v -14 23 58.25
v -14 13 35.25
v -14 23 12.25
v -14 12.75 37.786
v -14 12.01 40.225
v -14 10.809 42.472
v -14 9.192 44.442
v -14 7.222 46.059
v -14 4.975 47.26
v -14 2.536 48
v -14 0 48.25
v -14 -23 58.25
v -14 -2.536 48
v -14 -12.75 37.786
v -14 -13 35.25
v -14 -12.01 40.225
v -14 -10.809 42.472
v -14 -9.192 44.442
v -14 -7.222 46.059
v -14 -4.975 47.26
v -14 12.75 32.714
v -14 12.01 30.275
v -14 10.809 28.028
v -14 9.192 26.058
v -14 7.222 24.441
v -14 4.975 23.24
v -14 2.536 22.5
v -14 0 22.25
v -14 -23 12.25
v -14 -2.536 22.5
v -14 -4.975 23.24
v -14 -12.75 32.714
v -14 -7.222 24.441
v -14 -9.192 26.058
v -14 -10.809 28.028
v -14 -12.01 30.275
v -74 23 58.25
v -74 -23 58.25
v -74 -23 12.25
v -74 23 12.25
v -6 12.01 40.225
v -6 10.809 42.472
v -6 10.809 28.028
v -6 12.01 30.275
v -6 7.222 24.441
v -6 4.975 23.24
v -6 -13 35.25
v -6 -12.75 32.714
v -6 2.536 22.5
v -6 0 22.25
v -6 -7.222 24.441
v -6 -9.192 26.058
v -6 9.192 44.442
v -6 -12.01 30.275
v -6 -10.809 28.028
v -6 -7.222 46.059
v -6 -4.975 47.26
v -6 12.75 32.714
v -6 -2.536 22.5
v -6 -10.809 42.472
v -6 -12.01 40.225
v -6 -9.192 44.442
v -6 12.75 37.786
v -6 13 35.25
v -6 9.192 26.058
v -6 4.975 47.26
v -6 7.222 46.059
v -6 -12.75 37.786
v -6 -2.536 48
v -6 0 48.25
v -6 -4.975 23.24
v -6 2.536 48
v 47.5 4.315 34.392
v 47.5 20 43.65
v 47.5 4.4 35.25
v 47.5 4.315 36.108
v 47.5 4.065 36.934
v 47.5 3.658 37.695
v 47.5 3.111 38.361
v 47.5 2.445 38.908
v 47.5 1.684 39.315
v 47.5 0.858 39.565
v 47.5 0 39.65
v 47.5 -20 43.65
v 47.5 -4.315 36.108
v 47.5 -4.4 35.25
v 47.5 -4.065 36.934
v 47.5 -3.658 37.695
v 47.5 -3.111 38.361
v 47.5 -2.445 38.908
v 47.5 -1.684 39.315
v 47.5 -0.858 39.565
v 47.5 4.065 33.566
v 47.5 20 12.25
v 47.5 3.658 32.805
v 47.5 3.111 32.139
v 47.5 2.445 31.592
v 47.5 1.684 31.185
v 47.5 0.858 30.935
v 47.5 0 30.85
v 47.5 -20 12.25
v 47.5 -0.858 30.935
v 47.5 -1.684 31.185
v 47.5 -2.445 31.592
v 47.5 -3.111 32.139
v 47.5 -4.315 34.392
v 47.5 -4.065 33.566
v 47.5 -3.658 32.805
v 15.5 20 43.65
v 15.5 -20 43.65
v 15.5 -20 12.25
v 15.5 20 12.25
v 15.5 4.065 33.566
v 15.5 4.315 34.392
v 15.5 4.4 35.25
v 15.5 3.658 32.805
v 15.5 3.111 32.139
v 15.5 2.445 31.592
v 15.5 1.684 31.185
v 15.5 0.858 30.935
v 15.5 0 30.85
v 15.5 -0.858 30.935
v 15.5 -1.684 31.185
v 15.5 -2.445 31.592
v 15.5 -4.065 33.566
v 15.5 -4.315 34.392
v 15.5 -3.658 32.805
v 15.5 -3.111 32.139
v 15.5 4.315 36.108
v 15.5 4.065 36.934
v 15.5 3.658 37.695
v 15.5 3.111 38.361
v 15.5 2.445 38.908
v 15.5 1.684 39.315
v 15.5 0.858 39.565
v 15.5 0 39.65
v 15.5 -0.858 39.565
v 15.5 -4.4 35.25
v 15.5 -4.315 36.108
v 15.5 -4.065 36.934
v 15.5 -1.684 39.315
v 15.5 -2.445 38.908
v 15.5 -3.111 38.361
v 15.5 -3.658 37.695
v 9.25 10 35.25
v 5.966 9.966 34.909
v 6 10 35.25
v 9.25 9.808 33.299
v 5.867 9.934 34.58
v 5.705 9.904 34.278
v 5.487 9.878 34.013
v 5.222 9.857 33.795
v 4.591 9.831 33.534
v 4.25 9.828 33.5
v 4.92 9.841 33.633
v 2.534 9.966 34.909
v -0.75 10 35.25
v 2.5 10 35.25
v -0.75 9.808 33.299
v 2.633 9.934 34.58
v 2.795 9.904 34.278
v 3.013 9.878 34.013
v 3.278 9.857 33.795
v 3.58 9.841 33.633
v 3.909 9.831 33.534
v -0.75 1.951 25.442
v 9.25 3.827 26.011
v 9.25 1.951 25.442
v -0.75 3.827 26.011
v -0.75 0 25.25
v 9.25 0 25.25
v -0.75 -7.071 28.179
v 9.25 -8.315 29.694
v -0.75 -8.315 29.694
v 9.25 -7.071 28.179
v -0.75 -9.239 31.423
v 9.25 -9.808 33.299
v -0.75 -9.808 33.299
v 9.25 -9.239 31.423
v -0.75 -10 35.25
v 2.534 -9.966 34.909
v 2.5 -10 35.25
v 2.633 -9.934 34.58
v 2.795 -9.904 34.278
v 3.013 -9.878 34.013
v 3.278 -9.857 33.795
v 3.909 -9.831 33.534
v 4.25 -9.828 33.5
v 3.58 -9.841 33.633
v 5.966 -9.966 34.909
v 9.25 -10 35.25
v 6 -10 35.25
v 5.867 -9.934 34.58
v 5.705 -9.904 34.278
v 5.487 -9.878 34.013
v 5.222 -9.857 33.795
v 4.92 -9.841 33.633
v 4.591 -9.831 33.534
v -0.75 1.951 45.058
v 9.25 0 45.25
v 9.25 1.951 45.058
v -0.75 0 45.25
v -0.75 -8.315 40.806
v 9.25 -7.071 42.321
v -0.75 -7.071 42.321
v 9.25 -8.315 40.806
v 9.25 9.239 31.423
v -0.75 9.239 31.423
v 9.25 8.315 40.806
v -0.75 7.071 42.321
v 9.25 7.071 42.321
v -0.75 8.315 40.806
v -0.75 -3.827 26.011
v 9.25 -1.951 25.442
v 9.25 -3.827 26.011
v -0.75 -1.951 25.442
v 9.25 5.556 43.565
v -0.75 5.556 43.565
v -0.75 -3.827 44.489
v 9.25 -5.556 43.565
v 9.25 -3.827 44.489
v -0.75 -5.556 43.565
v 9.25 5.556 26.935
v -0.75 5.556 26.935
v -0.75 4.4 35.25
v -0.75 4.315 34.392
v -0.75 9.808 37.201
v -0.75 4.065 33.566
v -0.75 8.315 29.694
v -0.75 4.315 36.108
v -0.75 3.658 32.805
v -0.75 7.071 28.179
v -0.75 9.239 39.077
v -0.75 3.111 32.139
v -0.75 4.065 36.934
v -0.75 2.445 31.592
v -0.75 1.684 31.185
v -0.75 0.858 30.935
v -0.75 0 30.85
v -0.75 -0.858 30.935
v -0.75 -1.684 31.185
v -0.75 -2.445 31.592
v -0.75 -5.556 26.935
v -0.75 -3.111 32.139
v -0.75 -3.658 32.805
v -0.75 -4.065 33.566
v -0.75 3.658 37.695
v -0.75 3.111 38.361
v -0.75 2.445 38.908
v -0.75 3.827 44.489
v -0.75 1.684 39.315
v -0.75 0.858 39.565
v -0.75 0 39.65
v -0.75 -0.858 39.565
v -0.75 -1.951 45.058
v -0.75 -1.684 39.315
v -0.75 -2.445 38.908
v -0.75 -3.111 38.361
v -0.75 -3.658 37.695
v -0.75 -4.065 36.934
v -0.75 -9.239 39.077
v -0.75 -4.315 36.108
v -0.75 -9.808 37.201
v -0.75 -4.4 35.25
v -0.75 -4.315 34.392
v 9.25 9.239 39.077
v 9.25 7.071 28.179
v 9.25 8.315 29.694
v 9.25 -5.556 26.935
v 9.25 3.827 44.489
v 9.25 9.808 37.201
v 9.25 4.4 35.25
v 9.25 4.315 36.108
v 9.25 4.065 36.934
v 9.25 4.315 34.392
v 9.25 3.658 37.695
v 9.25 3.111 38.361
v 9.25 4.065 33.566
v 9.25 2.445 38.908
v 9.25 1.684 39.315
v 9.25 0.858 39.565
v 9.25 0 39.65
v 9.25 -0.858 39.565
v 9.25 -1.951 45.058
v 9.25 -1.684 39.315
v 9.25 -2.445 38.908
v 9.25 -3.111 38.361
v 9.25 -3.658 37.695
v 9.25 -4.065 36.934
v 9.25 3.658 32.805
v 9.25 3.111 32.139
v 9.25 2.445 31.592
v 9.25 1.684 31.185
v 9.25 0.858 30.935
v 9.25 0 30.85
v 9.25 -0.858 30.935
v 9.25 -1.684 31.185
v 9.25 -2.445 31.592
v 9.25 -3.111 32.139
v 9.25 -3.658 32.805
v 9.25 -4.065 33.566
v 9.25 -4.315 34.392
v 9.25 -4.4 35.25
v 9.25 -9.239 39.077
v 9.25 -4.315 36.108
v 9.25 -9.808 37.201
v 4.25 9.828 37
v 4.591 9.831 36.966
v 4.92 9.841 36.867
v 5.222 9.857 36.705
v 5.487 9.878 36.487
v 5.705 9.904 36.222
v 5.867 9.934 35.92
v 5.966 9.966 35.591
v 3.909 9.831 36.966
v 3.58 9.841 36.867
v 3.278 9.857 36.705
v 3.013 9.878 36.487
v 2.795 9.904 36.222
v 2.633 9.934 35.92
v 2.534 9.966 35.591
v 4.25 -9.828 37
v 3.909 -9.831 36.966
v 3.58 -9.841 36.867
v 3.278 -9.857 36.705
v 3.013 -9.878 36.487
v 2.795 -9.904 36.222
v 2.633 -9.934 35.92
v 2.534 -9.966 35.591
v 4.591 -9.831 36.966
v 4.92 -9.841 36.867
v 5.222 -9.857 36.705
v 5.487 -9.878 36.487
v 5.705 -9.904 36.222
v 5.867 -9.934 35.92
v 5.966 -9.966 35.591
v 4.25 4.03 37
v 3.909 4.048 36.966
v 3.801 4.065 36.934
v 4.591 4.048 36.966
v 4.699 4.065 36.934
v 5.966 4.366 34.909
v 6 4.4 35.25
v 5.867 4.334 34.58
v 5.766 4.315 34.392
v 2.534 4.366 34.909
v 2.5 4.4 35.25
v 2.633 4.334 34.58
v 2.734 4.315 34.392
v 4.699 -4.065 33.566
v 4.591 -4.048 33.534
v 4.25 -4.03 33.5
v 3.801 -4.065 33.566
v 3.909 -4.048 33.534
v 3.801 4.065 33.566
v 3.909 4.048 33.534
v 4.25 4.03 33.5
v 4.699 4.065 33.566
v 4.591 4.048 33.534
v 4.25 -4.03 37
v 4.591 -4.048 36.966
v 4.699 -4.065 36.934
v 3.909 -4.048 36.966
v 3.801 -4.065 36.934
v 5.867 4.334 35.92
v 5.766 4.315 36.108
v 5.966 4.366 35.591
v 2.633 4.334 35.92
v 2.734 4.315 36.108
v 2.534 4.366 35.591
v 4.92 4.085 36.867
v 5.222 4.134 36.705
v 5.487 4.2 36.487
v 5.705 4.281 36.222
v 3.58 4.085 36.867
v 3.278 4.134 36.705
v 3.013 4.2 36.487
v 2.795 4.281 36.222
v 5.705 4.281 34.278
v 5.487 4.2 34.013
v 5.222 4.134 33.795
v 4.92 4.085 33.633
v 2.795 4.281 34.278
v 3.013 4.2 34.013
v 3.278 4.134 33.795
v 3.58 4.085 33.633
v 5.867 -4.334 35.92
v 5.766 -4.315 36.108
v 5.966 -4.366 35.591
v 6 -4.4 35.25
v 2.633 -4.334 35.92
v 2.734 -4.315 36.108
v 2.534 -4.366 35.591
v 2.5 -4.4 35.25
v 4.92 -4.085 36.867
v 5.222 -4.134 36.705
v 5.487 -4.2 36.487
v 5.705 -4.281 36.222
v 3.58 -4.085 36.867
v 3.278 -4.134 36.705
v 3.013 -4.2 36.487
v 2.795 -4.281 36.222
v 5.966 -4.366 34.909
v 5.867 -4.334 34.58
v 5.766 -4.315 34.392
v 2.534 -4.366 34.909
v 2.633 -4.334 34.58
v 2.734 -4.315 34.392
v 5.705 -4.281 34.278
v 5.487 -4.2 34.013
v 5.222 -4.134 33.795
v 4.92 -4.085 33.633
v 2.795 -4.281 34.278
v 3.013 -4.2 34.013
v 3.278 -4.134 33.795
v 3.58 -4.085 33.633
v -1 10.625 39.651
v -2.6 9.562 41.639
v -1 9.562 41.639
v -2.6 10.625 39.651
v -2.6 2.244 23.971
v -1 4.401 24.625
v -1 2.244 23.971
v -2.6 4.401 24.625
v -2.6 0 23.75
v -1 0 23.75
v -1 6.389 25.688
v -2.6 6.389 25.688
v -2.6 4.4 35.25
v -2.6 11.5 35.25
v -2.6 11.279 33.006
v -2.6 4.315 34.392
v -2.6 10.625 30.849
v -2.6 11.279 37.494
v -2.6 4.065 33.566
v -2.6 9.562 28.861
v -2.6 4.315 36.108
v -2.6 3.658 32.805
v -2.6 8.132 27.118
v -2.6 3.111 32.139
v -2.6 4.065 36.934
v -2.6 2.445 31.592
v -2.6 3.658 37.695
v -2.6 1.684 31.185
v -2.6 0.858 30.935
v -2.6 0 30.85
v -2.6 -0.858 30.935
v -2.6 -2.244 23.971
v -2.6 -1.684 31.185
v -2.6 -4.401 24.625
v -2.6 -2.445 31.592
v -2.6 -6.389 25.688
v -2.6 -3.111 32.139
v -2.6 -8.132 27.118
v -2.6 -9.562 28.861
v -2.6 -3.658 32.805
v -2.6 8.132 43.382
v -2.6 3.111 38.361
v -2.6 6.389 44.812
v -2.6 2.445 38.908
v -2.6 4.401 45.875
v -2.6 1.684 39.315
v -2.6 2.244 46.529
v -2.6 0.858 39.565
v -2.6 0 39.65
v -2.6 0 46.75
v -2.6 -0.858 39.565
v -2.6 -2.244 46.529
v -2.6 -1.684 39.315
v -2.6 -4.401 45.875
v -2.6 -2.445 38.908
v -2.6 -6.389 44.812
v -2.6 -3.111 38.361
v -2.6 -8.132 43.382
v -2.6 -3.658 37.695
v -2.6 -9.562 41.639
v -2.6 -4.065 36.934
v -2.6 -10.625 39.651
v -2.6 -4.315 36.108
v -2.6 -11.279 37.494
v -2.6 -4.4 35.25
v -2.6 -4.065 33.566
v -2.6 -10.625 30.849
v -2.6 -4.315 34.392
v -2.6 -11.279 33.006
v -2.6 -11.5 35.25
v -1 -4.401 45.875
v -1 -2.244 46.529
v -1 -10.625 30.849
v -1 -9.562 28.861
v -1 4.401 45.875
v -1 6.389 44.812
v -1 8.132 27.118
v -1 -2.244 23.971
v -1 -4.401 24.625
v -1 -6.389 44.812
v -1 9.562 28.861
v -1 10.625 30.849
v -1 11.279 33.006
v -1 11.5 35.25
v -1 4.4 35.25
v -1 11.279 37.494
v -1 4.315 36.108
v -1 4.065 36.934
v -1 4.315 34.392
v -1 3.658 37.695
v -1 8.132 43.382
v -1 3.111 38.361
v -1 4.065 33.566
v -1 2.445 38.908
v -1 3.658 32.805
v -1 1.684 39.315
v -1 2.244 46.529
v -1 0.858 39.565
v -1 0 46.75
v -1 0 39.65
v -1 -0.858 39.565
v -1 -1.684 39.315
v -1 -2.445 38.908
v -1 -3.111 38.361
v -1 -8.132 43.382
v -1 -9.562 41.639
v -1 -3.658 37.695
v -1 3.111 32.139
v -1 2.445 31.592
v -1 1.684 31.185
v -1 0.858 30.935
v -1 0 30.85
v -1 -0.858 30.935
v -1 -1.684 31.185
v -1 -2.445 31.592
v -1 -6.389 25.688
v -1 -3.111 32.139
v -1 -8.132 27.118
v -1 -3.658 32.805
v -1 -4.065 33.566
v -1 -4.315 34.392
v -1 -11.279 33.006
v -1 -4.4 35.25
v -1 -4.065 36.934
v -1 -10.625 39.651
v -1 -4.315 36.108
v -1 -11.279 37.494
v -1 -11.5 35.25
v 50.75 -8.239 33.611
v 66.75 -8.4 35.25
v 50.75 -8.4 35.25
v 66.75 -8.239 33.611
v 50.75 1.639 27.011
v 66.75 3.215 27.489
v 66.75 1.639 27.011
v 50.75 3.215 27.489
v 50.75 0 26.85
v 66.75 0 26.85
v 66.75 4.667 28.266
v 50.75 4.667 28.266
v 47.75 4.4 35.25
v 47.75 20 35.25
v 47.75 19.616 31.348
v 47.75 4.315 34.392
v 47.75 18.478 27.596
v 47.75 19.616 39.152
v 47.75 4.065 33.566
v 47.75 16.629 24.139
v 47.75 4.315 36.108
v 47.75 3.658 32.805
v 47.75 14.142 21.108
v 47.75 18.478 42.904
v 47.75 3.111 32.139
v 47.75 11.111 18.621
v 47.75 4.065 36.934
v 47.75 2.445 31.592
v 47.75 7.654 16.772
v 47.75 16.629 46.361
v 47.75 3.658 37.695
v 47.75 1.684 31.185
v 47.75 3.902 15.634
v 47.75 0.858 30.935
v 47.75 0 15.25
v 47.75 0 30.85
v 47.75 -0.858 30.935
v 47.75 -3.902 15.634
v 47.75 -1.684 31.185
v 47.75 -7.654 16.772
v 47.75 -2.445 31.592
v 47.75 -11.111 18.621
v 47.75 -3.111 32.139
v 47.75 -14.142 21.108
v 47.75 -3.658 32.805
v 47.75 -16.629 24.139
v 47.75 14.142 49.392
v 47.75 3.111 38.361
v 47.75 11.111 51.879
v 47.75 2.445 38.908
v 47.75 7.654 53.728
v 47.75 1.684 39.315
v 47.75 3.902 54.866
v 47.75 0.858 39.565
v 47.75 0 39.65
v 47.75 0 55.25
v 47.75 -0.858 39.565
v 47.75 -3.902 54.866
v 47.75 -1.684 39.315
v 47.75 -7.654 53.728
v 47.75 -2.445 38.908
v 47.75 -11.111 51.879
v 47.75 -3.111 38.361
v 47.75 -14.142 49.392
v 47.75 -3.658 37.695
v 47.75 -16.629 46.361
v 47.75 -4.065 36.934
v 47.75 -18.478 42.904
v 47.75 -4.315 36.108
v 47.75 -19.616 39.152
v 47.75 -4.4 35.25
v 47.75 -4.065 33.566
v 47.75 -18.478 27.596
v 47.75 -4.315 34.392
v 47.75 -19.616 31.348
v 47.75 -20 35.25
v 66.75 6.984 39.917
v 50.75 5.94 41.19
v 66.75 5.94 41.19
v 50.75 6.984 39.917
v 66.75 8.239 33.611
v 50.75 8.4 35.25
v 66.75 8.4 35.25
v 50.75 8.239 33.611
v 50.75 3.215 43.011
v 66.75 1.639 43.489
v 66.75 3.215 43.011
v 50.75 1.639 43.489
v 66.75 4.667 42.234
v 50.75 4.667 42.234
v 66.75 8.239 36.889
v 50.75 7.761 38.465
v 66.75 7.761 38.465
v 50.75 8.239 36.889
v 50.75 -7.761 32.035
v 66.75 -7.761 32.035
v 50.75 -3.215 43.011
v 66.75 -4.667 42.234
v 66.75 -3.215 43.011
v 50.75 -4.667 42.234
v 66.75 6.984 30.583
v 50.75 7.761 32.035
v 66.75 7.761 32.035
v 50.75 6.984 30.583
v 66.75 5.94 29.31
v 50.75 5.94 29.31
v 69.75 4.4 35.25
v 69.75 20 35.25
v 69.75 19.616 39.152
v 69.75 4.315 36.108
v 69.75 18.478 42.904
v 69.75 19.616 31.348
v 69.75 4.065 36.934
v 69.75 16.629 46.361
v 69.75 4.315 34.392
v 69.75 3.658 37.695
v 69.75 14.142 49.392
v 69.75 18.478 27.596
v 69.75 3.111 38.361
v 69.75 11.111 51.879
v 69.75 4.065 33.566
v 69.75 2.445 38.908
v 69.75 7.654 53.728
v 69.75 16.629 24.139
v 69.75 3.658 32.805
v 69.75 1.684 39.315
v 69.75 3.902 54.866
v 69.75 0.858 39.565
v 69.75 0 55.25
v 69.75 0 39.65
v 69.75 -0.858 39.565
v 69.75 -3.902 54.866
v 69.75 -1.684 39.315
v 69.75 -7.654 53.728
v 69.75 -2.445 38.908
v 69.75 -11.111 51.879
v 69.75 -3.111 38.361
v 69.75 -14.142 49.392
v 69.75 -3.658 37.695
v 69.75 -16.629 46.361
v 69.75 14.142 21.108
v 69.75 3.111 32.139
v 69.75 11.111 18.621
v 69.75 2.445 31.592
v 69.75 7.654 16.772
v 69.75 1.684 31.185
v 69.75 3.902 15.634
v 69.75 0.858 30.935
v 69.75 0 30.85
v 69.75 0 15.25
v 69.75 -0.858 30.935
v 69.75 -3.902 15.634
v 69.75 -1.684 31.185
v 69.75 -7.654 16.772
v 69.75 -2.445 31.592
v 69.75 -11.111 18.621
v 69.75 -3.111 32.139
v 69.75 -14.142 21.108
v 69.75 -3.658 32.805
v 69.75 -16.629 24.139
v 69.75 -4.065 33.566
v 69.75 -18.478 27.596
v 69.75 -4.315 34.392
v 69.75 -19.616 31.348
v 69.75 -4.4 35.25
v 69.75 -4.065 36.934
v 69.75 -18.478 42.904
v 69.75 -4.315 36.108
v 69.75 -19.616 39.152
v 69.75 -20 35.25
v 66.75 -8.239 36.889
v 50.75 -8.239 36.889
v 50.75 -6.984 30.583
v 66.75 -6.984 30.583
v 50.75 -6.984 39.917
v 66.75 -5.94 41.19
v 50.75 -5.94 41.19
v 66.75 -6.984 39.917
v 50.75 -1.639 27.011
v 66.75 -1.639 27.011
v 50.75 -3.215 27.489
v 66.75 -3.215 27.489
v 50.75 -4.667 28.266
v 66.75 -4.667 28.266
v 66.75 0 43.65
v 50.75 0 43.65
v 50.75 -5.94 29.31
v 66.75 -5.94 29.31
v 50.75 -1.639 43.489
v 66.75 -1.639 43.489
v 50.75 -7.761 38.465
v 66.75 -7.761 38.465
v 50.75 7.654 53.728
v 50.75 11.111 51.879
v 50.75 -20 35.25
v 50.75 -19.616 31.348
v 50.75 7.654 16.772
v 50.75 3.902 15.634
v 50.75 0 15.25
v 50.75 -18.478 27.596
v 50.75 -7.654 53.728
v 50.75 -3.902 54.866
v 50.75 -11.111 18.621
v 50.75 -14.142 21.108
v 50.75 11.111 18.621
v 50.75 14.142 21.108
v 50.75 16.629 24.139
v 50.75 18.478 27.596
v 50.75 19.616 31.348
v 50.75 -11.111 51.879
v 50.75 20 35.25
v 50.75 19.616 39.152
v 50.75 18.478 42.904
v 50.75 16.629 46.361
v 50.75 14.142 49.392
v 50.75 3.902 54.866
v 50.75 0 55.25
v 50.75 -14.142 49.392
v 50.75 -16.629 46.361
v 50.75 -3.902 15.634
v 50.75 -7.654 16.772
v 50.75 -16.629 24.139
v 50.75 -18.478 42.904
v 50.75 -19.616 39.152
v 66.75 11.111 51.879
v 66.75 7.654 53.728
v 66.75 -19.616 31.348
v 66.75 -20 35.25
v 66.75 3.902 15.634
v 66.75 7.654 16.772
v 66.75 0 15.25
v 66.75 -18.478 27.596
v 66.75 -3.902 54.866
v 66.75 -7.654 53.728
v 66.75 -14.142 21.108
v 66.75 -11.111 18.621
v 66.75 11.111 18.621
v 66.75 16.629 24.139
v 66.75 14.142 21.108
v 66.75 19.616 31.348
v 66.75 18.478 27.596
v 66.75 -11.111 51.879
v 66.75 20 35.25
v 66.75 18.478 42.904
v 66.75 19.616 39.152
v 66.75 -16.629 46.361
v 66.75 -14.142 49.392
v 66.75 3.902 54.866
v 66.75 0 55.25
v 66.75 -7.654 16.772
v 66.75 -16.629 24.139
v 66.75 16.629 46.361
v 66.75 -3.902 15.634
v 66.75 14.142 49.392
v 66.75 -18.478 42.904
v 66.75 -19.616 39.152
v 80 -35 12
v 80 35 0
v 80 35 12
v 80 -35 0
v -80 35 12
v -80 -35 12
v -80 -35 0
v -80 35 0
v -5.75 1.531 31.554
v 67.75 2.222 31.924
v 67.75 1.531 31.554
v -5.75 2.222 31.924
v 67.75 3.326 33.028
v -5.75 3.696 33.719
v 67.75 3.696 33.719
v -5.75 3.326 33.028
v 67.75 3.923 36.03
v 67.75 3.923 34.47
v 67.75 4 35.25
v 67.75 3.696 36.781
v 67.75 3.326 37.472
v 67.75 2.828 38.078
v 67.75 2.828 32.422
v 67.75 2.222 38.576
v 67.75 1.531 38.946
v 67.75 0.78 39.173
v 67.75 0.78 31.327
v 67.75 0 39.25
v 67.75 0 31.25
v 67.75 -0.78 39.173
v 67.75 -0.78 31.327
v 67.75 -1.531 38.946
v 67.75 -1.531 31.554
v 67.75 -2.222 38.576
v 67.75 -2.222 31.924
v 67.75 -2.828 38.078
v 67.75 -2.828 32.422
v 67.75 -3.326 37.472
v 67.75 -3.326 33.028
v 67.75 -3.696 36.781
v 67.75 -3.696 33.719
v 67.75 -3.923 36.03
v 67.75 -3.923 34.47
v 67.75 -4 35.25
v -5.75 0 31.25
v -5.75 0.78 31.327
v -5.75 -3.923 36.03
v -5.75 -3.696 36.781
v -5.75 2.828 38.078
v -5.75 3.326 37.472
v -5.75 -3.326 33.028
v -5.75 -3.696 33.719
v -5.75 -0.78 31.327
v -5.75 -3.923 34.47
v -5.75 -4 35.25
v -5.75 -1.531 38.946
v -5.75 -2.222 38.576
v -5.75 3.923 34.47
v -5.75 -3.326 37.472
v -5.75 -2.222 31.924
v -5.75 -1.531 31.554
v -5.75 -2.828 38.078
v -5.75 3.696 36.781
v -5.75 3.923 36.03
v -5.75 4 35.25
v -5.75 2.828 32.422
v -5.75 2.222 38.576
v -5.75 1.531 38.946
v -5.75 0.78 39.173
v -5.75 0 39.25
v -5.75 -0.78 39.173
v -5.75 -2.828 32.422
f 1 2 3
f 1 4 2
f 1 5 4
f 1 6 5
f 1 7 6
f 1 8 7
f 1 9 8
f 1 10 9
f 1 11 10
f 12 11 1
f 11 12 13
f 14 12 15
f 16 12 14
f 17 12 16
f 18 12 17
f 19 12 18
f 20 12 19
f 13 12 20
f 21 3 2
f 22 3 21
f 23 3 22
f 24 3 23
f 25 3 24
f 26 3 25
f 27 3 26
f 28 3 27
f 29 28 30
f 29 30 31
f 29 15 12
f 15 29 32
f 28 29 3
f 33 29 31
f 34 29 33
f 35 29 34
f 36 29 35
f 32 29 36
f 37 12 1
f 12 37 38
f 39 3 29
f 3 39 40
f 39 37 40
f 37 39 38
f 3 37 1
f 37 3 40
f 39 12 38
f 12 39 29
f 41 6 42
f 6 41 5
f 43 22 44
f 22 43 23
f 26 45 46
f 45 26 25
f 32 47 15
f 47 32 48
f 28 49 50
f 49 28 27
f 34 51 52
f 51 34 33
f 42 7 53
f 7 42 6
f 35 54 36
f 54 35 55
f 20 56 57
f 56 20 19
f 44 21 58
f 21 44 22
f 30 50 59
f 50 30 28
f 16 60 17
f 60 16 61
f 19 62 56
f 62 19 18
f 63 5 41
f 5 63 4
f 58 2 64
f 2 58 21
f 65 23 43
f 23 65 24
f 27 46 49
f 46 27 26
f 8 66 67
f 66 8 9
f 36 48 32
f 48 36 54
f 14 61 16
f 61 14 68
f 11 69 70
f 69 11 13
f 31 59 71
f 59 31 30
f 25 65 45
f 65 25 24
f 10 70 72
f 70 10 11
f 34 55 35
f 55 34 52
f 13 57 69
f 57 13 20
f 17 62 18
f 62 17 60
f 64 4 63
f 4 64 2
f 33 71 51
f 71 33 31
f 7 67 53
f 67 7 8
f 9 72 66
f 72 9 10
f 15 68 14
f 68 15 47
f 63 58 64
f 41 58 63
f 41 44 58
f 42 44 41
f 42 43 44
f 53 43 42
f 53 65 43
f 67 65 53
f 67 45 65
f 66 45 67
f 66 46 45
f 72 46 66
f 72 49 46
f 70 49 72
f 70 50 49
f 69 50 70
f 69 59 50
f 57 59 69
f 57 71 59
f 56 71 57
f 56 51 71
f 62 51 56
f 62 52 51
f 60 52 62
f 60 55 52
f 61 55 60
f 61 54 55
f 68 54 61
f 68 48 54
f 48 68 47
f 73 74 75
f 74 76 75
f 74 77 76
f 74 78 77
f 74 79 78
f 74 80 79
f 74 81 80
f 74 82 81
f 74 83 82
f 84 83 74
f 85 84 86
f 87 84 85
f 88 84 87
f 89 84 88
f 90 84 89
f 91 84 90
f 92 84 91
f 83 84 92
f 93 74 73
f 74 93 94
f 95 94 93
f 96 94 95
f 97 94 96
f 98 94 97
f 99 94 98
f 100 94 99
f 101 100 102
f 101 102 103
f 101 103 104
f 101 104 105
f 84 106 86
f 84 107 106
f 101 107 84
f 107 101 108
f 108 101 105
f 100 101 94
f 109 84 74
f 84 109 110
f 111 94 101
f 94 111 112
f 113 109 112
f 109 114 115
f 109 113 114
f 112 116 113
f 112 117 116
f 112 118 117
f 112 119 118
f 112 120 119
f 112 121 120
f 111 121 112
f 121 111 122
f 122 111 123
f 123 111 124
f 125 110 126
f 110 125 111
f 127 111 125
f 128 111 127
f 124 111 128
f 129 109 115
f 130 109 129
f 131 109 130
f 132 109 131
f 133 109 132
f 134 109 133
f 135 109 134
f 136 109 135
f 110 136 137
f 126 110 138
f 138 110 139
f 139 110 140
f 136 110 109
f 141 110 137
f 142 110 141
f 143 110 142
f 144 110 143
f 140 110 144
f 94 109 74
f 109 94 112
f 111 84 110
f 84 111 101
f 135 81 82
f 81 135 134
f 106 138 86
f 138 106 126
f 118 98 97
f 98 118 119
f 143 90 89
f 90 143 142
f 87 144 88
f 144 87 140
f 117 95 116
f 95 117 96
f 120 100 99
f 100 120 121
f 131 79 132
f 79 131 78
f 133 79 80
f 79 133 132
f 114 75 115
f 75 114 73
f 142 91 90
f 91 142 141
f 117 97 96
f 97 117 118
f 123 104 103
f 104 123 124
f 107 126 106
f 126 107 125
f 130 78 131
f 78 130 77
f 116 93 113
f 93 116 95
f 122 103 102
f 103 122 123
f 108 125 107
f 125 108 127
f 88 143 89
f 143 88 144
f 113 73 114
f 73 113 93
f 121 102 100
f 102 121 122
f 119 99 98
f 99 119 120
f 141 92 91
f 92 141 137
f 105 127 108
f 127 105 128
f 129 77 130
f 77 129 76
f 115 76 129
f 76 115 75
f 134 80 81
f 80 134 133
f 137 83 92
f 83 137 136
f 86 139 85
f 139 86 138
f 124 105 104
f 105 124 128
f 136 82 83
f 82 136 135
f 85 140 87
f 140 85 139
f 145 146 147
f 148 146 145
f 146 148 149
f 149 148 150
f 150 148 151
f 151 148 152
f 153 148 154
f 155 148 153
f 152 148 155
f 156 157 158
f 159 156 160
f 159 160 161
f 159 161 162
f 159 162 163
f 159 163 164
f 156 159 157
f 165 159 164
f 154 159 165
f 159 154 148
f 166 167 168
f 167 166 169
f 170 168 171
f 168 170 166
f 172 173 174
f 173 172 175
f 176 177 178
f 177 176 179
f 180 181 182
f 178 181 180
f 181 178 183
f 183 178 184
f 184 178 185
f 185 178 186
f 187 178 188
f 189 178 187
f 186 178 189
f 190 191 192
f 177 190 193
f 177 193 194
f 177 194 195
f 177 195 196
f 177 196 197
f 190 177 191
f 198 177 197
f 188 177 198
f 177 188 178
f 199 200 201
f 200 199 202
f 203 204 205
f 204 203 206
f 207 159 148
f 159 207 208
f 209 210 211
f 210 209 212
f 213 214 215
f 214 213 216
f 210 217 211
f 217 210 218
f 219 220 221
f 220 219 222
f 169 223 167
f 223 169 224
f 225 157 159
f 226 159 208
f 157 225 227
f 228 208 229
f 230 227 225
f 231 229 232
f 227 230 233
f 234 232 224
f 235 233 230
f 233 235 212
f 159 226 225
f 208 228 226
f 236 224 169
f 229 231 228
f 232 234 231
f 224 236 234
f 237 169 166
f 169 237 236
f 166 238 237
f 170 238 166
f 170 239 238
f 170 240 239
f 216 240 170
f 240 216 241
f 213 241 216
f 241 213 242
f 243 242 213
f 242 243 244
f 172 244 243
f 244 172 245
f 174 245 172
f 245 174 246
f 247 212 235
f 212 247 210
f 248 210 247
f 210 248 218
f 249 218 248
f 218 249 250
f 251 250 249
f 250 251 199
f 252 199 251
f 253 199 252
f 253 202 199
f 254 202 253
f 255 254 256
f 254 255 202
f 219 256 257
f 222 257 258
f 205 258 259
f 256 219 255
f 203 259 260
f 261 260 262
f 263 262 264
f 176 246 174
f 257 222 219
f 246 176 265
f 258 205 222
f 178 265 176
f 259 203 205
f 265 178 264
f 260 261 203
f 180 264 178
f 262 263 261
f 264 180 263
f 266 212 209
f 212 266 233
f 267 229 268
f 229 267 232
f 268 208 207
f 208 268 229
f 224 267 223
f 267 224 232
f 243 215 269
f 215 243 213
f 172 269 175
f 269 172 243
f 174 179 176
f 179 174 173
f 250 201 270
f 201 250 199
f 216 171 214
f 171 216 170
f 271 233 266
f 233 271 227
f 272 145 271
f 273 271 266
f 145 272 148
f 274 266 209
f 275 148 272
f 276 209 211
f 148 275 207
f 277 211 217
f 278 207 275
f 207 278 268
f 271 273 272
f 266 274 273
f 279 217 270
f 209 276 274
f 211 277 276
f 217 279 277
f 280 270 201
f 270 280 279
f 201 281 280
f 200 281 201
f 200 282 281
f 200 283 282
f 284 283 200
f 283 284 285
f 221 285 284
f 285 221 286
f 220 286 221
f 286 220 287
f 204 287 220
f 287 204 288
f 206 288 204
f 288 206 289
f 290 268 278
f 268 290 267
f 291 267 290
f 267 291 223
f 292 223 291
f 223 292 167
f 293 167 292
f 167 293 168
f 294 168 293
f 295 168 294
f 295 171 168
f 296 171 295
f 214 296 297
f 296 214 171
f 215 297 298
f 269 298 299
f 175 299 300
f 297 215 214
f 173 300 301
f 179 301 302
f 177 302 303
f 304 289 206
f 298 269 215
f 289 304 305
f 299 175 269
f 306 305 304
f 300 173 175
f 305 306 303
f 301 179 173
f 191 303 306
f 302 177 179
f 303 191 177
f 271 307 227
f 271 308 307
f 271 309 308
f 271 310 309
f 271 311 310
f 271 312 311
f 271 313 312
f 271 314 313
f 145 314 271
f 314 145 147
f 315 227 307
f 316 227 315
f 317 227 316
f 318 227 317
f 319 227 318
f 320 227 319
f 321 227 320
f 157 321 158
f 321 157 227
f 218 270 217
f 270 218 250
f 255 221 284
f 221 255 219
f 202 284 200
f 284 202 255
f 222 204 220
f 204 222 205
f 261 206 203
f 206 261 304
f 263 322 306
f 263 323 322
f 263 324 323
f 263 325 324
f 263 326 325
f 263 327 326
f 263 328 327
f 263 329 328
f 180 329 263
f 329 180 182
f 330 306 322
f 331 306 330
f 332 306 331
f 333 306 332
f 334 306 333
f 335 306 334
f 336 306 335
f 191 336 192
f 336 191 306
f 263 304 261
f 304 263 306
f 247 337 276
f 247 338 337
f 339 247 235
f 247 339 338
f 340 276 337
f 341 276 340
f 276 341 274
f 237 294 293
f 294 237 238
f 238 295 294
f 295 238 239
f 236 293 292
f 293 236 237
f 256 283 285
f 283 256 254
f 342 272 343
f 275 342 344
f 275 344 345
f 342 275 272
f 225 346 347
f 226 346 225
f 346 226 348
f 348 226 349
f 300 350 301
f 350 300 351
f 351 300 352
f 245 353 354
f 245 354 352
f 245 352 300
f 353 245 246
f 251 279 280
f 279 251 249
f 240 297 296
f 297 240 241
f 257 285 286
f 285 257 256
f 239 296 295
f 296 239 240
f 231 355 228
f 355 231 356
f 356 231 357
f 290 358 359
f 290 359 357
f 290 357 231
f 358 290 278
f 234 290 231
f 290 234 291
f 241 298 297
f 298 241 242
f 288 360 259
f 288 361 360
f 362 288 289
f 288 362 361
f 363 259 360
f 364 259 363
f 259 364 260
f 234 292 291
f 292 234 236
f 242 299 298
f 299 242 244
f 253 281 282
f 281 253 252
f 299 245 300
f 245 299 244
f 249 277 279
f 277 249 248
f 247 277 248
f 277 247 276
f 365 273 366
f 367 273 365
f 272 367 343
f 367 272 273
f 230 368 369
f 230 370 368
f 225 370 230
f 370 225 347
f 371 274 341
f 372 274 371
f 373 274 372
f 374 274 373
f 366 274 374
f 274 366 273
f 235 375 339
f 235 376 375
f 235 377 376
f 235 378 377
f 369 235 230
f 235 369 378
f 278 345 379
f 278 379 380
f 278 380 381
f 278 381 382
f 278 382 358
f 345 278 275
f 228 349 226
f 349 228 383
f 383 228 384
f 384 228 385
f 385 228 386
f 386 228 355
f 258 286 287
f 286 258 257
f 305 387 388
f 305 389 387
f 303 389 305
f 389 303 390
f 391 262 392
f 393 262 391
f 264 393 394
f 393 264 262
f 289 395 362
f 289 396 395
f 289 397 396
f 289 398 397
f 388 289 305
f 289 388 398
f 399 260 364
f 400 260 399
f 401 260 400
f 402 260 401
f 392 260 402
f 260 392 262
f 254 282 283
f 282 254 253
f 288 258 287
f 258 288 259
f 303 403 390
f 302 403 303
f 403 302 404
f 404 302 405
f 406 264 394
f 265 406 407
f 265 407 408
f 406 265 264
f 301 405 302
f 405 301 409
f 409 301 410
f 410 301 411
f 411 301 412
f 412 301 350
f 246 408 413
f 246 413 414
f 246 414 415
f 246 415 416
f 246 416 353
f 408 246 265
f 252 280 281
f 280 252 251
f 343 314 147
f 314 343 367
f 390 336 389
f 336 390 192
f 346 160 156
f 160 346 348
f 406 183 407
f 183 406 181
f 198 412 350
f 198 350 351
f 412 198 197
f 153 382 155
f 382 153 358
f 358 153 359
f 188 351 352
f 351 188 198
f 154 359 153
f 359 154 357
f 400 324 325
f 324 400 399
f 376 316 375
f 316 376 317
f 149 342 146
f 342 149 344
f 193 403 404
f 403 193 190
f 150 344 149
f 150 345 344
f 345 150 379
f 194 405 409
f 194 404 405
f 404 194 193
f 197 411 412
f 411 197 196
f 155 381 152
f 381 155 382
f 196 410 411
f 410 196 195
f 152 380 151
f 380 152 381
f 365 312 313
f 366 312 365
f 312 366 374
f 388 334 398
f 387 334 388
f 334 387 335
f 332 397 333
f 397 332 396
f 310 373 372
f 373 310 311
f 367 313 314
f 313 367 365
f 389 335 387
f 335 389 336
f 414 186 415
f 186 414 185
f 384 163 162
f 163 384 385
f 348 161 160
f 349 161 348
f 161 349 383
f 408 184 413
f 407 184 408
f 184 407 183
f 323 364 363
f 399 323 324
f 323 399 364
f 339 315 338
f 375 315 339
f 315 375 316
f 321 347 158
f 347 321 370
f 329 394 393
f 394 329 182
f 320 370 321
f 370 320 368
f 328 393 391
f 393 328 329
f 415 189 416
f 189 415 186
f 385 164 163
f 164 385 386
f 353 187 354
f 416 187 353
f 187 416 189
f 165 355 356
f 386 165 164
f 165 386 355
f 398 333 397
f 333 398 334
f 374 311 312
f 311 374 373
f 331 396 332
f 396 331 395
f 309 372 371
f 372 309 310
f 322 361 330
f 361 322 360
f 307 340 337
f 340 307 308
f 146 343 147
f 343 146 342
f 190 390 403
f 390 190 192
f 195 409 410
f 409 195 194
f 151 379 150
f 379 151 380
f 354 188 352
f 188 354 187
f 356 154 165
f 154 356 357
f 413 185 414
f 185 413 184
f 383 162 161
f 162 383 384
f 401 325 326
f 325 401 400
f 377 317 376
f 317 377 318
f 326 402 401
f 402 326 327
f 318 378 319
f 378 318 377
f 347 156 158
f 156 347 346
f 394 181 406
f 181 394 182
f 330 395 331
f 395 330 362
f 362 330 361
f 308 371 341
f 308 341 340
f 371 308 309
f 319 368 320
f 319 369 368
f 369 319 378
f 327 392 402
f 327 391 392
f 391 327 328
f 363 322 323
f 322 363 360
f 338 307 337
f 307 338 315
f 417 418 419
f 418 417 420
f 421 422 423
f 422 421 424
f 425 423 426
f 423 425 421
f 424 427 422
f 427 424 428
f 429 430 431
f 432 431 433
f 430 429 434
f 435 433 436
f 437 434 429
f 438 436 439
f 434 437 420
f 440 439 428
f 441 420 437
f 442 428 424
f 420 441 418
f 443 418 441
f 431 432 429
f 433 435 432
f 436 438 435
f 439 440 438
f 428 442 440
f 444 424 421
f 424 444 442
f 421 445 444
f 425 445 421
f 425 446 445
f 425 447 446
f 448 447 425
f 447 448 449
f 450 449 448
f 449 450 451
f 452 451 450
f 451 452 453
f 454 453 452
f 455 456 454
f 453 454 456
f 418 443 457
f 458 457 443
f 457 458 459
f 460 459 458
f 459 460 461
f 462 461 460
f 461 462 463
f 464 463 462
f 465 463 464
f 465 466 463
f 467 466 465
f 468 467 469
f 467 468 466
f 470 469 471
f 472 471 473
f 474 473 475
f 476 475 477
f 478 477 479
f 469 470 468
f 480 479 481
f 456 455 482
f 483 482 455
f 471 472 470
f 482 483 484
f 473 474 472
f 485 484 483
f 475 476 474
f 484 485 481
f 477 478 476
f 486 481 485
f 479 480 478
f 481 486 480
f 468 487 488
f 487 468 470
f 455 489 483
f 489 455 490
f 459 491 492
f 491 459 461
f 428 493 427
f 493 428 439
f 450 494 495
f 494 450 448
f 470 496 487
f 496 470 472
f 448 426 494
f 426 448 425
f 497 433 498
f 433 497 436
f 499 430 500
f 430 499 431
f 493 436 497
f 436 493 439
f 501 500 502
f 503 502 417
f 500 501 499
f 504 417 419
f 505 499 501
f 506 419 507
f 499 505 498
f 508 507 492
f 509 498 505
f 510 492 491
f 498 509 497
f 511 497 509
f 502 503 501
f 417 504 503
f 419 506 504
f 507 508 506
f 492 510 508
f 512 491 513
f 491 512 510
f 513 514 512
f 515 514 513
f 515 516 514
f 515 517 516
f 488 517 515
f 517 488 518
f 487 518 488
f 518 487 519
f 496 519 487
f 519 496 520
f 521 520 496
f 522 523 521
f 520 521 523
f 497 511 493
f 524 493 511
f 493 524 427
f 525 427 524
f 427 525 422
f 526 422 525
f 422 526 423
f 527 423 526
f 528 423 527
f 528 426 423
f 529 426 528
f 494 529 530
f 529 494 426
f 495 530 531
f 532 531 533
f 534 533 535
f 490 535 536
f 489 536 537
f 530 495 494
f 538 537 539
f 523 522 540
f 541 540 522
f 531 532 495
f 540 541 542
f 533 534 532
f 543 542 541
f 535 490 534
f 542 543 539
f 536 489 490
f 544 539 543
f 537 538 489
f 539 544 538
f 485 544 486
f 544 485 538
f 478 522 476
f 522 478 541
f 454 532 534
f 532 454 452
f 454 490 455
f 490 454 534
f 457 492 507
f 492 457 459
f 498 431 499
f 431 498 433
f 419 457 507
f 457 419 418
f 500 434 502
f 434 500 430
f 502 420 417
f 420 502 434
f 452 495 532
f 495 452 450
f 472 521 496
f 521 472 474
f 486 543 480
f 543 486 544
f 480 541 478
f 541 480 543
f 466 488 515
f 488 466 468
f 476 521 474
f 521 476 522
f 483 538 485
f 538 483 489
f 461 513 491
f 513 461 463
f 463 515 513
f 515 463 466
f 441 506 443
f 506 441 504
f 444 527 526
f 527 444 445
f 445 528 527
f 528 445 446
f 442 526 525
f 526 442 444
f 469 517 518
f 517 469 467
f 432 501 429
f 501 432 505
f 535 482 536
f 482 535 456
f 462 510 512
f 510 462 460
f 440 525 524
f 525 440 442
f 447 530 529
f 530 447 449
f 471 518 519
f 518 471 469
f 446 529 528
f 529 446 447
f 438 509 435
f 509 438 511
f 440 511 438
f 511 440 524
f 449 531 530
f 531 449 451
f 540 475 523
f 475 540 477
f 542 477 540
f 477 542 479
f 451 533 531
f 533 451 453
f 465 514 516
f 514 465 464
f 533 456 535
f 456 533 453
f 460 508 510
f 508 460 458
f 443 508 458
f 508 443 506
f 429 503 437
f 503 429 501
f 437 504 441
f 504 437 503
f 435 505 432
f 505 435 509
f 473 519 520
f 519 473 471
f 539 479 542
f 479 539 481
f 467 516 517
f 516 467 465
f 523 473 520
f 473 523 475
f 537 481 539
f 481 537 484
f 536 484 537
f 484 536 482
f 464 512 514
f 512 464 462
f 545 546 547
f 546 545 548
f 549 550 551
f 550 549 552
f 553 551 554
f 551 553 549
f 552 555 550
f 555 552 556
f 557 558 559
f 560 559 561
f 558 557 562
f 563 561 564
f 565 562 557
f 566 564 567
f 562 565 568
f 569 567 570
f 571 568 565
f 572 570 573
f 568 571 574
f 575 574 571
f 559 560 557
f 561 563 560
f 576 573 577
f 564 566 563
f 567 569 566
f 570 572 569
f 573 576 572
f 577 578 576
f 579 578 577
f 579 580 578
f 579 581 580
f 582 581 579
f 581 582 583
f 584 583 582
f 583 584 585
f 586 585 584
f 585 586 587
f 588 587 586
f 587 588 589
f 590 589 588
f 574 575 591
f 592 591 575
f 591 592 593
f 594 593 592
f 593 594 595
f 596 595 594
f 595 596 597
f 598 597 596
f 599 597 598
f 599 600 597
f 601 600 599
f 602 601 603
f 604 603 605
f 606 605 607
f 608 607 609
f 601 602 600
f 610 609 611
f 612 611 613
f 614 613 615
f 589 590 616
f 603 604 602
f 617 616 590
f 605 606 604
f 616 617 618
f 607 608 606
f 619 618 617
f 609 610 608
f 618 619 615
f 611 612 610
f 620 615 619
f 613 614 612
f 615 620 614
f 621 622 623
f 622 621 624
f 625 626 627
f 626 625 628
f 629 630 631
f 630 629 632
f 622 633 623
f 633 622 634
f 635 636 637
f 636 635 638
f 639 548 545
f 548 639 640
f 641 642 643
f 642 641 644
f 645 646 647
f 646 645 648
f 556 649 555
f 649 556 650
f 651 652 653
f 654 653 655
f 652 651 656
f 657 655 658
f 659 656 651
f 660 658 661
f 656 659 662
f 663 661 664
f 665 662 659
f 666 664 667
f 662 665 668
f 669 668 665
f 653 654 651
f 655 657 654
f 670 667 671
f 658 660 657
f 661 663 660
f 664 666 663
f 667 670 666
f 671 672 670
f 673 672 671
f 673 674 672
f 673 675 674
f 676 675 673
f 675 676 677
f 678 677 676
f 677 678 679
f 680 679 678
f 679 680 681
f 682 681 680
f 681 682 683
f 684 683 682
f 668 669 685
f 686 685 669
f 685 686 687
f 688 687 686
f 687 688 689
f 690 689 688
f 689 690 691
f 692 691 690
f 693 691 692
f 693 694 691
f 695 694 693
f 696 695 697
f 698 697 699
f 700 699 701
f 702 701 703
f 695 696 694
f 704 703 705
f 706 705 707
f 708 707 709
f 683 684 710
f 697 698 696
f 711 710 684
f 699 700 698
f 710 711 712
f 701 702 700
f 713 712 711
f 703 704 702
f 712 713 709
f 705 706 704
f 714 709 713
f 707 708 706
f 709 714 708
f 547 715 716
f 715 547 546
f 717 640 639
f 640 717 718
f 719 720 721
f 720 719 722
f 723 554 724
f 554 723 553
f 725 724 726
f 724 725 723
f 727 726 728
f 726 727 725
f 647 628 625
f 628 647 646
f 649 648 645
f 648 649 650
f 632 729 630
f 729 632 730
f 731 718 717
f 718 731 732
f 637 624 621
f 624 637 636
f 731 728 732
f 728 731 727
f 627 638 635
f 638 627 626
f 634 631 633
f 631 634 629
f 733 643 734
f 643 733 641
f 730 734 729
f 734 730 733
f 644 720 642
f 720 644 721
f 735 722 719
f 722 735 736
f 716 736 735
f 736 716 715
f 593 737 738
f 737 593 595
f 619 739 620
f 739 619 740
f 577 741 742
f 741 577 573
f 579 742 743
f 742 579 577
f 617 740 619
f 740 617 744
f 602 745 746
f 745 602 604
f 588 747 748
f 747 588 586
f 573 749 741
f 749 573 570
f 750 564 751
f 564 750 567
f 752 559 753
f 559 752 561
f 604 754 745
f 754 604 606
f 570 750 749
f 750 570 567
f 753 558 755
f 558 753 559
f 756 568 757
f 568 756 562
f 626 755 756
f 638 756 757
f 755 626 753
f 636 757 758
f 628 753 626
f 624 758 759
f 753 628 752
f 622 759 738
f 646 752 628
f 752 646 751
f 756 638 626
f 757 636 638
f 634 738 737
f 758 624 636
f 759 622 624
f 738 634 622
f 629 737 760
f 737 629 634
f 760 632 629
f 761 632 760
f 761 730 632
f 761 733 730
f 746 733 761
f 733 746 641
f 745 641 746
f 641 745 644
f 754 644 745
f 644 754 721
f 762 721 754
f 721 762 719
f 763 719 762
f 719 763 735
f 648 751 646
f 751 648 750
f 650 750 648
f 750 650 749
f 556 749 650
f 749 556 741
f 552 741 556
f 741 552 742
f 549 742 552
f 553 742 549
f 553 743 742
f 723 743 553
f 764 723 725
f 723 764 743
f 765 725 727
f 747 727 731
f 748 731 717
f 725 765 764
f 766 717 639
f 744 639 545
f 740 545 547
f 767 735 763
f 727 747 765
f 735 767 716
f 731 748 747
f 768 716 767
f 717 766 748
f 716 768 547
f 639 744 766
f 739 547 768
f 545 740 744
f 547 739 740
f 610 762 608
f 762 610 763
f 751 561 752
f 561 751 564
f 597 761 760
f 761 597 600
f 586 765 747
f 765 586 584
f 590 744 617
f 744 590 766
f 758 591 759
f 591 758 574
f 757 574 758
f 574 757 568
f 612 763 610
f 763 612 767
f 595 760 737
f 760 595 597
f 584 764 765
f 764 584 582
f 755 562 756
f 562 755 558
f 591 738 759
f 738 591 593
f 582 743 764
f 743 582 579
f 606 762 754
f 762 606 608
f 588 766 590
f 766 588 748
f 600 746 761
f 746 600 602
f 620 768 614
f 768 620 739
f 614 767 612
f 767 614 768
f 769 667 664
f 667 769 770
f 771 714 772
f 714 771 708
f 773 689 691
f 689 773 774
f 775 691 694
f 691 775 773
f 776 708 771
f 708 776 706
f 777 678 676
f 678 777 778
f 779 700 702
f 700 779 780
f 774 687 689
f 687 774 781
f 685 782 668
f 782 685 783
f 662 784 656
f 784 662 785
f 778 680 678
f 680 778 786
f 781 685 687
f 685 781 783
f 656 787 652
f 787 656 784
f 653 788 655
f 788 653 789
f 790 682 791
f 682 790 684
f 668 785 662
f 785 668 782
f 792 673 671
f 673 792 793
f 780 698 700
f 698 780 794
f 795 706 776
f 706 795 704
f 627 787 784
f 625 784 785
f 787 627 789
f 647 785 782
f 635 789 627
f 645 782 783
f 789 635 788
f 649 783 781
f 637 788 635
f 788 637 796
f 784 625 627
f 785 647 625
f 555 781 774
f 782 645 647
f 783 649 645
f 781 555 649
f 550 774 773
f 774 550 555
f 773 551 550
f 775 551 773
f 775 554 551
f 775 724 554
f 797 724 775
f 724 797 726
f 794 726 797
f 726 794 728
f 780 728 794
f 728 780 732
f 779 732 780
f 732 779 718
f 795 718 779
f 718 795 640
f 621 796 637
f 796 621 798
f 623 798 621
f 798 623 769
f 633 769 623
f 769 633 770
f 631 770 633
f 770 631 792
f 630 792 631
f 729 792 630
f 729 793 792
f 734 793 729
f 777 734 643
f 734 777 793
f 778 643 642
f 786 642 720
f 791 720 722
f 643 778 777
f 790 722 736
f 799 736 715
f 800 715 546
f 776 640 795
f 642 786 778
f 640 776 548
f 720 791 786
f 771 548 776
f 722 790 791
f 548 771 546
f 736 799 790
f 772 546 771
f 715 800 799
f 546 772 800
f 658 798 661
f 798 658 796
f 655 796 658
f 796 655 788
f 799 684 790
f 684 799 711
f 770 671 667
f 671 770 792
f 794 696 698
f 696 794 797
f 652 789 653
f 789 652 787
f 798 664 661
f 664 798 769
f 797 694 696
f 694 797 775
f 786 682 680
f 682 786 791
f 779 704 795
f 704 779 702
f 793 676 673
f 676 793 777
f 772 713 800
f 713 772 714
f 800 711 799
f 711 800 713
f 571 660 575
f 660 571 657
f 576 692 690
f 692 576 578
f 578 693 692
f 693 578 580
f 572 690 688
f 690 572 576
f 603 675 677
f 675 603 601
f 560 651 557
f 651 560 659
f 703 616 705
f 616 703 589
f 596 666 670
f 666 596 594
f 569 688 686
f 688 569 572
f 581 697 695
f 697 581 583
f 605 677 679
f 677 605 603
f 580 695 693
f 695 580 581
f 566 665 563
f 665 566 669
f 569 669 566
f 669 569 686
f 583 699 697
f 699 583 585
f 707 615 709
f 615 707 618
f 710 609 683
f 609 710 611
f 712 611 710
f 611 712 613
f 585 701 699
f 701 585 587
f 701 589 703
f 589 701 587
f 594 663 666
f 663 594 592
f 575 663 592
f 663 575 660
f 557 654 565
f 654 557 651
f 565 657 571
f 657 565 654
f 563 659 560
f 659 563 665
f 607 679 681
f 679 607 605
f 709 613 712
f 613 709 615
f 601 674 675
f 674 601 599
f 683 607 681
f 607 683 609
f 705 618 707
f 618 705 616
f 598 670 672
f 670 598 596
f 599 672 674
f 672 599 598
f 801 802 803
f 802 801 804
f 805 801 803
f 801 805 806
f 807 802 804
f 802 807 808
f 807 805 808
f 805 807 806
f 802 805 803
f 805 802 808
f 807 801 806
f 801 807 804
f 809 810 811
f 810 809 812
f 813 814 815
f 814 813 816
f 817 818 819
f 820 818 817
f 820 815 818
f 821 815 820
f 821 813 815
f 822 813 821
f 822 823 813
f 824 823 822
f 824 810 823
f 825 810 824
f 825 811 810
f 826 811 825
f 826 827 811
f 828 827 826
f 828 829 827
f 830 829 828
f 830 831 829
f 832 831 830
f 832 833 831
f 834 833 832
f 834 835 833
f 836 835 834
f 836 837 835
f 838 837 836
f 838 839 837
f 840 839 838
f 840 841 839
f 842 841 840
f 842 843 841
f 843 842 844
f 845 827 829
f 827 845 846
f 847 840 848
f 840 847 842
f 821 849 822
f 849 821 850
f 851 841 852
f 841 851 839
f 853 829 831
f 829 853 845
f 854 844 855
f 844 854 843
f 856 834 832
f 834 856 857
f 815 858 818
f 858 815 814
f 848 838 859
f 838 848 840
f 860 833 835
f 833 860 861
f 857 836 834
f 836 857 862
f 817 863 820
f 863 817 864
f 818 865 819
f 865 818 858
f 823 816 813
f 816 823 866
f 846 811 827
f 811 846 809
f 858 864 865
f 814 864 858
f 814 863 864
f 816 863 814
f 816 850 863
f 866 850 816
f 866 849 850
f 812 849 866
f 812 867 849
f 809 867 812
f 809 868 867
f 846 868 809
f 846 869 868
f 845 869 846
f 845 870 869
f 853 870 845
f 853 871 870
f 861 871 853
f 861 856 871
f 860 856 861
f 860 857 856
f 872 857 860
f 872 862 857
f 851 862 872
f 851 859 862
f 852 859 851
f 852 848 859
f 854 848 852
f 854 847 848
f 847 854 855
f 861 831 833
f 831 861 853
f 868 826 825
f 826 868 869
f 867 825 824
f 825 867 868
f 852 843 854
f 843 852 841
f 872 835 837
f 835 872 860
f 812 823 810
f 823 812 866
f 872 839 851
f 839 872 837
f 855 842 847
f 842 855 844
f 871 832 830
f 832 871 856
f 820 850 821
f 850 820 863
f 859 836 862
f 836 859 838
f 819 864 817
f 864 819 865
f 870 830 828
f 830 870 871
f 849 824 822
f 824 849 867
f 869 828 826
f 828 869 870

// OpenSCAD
$fn = 32;

// ------------------------------------------------------------------------
// Motor drive station: motor 60 x 46 mm, shaft d8, pulley d40
// Every part is its own module, assembly() places every instance.
// ------------------------------------------------------------------------

// --- part 1 ---
module station_bed() {
  difference() {
    translate([-80, -35, 0]) cube([160, 70, 12]);
  }
}

// --- part 2 ---
module drive_motor() {
  union() {
    translate([-30, -23, 0]) cube([60, 46, 46]);
    translate([34, 0, 23]) rotate([0, 90, 0]) cylinder(h = 8, d = 26, center = true);
  }
}

// --- part 3 ---
module pillow_block() {
  difference() {
    translate([-16, -20, 0]) cube([32, 40, 31.4]);
    translate([0, 0, 23]) rotate([0, 90, 0]) cylinder(h = 34, d = 8.8, center = true);
  }
}

// --- part 4 ---
module drive_shaft() {
  translate([0, 0, -36.75]) cylinder(h = 73.5, d = 8);
}

// --- part 5 ---
module shaft_collar() {
  difference() {
    cylinder(h = 10, d = 20);
    translate([0, 0, -1]) cylinder(h = 12, d = 8.8);
    translate([0, 0, 5]) rotate([90, 0, 0]) cylinder(h = 22, d = 3.5, center = true);
  }
}

// --- part 6 ---
module collar_washer() {
  difference() {
      translate([0, 0, 0]) cylinder(h = 1.6, d = 23);
      translate([0, 0, -1]) cylinder(h = 3.6, d = 8.8);
    }
}

// --- part 7 ---
module drive_pulley() {
  difference() {
    union() {
      cylinder(h = 22, d = 16.8);
      cylinder(h = 3, d = 40);
      translate([0, 0, 19]) cylinder(h = 3, d = 40);
    }
    translate([0, 0, -1]) cylinder(h = 24, d = 8.8);
  }
}

// --- assembly ---
module assembly() {
  color([0.80, 0.24, 0.20]) translate([0, 0, 0]) rotate([0, 0, 0]) station_bed();
  color([0.20, 0.45, 0.75]) translate([-44, 0, 12.25]) rotate([0, 0, 0]) drive_motor();
  color([0.25, 0.62, 0.32]) translate([31.5, 0, 12.25]) rotate([0, 0, 0]) pillow_block();
  color([0.92, 0.70, 0.18]) translate([31, 0, 35.25]) rotate([0, 90, 0]) drive_shaft();
  color([0.58, 0.35, 0.70]) translate([-0.75, 0, 35.25]) rotate([0, 90, 0]) shaft_collar();
  color([0.16, 0.66, 0.66]) translate([-2.6, 0, 35.25]) rotate([0, 90, 0]) collar_washer();
  color([0.85, 0.48, 0.18]) translate([47.75, 0, 35.25]) rotate([0, 90, 0]) drive_pulley();
}

assembly();
